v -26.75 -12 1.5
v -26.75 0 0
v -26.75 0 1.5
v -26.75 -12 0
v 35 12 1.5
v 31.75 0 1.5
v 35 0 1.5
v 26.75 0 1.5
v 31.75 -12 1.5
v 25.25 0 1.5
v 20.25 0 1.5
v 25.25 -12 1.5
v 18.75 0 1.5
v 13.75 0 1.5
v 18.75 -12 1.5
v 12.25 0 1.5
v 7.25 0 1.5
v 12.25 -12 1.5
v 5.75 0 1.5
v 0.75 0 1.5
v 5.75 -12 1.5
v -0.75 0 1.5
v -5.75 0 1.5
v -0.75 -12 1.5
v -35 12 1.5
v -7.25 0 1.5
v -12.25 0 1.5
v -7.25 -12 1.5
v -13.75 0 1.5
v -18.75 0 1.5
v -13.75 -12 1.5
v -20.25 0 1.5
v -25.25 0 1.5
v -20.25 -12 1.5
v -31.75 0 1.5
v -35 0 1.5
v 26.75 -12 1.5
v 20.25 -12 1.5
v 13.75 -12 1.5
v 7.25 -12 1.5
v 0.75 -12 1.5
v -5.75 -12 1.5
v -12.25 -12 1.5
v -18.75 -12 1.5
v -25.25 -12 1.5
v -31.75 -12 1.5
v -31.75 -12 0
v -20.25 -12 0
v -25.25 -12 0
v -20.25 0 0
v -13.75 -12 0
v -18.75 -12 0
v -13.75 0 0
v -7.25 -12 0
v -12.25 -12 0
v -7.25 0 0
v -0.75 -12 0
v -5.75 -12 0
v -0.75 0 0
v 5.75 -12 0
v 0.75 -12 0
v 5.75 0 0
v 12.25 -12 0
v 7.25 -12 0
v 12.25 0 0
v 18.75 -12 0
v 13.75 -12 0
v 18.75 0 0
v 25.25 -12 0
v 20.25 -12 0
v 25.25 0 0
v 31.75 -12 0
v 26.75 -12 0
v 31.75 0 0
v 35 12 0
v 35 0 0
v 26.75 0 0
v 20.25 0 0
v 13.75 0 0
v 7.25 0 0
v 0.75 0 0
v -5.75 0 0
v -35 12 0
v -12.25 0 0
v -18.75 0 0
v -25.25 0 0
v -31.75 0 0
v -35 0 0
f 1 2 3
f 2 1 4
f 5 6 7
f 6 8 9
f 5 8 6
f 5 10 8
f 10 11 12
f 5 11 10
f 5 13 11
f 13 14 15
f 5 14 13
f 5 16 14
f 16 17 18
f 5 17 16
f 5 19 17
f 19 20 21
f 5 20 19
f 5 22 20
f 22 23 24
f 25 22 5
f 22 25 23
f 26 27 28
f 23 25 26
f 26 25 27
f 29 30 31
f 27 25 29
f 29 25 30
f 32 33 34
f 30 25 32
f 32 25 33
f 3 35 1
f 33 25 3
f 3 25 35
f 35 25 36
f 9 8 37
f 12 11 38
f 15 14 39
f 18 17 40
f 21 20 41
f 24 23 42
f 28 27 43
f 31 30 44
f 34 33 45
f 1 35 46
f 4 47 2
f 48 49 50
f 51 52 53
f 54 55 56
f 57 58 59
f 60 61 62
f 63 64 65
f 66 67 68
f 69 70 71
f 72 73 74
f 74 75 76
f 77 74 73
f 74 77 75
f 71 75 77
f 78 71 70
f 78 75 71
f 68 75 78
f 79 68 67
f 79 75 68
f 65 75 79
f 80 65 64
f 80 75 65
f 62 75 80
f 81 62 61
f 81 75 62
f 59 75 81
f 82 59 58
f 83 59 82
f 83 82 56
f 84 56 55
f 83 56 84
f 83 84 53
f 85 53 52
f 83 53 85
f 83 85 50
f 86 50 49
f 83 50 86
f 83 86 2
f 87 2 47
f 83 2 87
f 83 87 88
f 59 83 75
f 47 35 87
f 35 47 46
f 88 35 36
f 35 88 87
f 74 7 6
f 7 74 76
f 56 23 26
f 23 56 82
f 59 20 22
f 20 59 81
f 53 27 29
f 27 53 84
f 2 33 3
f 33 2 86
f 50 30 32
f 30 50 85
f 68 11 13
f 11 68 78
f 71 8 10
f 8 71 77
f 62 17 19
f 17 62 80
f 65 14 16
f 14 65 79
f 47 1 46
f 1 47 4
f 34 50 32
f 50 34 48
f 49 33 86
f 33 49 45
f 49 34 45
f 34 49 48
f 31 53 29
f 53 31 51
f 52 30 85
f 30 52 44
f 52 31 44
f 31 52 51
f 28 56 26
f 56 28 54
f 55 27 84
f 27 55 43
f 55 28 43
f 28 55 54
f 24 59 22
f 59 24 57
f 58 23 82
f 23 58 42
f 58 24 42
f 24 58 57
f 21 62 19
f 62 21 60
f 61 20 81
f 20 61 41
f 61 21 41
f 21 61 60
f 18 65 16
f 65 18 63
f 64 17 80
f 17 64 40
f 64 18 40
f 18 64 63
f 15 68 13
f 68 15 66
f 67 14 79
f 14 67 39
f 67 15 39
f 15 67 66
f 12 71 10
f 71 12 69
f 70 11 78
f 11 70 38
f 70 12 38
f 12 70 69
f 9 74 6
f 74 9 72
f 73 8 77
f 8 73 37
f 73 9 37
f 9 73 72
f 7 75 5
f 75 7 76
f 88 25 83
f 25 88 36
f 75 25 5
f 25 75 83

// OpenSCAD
// 10-well agarose gel comb, printed lying flat
// Units: millimetres

// --- Dimensions ---
thickness       = 1.5;      // Z thickness
spine_len_x     = 70;       // Spine length (X)
spine_wid_y     = 12;       // Spine width (Y)
tooth_wid_x     = 5.0;      // Tooth width (X)
tooth_len_y     = 12;       // Tooth length (Y)
gap_x           = 1.5;      // Gap between teeth (X)
num_teeth       = 10;       // Number of teeth

// --- Derived ---
total_teeth_span_x = num_teeth * tooth_wid_x + (num_teeth - 1) * gap_x;
start_x            = -total_teeth_span_x / 2;

union() {
    // Spine (back bar)
    translate([-spine_len_x / 2, 0, 0])
        cube([spine_len_x, spine_wid_y, thickness]);

    // Teeth (hang in -Y direction from the spine's long edge)
    for (i = [0 : num_teeth - 1]) {
        tx = start_x + i * (tooth_wid_x + gap_x);
        translate([tx, -tooth_len_y, 0])
            cube([tooth_wid_x, tooth_len_y, thickness]);
    }
}
